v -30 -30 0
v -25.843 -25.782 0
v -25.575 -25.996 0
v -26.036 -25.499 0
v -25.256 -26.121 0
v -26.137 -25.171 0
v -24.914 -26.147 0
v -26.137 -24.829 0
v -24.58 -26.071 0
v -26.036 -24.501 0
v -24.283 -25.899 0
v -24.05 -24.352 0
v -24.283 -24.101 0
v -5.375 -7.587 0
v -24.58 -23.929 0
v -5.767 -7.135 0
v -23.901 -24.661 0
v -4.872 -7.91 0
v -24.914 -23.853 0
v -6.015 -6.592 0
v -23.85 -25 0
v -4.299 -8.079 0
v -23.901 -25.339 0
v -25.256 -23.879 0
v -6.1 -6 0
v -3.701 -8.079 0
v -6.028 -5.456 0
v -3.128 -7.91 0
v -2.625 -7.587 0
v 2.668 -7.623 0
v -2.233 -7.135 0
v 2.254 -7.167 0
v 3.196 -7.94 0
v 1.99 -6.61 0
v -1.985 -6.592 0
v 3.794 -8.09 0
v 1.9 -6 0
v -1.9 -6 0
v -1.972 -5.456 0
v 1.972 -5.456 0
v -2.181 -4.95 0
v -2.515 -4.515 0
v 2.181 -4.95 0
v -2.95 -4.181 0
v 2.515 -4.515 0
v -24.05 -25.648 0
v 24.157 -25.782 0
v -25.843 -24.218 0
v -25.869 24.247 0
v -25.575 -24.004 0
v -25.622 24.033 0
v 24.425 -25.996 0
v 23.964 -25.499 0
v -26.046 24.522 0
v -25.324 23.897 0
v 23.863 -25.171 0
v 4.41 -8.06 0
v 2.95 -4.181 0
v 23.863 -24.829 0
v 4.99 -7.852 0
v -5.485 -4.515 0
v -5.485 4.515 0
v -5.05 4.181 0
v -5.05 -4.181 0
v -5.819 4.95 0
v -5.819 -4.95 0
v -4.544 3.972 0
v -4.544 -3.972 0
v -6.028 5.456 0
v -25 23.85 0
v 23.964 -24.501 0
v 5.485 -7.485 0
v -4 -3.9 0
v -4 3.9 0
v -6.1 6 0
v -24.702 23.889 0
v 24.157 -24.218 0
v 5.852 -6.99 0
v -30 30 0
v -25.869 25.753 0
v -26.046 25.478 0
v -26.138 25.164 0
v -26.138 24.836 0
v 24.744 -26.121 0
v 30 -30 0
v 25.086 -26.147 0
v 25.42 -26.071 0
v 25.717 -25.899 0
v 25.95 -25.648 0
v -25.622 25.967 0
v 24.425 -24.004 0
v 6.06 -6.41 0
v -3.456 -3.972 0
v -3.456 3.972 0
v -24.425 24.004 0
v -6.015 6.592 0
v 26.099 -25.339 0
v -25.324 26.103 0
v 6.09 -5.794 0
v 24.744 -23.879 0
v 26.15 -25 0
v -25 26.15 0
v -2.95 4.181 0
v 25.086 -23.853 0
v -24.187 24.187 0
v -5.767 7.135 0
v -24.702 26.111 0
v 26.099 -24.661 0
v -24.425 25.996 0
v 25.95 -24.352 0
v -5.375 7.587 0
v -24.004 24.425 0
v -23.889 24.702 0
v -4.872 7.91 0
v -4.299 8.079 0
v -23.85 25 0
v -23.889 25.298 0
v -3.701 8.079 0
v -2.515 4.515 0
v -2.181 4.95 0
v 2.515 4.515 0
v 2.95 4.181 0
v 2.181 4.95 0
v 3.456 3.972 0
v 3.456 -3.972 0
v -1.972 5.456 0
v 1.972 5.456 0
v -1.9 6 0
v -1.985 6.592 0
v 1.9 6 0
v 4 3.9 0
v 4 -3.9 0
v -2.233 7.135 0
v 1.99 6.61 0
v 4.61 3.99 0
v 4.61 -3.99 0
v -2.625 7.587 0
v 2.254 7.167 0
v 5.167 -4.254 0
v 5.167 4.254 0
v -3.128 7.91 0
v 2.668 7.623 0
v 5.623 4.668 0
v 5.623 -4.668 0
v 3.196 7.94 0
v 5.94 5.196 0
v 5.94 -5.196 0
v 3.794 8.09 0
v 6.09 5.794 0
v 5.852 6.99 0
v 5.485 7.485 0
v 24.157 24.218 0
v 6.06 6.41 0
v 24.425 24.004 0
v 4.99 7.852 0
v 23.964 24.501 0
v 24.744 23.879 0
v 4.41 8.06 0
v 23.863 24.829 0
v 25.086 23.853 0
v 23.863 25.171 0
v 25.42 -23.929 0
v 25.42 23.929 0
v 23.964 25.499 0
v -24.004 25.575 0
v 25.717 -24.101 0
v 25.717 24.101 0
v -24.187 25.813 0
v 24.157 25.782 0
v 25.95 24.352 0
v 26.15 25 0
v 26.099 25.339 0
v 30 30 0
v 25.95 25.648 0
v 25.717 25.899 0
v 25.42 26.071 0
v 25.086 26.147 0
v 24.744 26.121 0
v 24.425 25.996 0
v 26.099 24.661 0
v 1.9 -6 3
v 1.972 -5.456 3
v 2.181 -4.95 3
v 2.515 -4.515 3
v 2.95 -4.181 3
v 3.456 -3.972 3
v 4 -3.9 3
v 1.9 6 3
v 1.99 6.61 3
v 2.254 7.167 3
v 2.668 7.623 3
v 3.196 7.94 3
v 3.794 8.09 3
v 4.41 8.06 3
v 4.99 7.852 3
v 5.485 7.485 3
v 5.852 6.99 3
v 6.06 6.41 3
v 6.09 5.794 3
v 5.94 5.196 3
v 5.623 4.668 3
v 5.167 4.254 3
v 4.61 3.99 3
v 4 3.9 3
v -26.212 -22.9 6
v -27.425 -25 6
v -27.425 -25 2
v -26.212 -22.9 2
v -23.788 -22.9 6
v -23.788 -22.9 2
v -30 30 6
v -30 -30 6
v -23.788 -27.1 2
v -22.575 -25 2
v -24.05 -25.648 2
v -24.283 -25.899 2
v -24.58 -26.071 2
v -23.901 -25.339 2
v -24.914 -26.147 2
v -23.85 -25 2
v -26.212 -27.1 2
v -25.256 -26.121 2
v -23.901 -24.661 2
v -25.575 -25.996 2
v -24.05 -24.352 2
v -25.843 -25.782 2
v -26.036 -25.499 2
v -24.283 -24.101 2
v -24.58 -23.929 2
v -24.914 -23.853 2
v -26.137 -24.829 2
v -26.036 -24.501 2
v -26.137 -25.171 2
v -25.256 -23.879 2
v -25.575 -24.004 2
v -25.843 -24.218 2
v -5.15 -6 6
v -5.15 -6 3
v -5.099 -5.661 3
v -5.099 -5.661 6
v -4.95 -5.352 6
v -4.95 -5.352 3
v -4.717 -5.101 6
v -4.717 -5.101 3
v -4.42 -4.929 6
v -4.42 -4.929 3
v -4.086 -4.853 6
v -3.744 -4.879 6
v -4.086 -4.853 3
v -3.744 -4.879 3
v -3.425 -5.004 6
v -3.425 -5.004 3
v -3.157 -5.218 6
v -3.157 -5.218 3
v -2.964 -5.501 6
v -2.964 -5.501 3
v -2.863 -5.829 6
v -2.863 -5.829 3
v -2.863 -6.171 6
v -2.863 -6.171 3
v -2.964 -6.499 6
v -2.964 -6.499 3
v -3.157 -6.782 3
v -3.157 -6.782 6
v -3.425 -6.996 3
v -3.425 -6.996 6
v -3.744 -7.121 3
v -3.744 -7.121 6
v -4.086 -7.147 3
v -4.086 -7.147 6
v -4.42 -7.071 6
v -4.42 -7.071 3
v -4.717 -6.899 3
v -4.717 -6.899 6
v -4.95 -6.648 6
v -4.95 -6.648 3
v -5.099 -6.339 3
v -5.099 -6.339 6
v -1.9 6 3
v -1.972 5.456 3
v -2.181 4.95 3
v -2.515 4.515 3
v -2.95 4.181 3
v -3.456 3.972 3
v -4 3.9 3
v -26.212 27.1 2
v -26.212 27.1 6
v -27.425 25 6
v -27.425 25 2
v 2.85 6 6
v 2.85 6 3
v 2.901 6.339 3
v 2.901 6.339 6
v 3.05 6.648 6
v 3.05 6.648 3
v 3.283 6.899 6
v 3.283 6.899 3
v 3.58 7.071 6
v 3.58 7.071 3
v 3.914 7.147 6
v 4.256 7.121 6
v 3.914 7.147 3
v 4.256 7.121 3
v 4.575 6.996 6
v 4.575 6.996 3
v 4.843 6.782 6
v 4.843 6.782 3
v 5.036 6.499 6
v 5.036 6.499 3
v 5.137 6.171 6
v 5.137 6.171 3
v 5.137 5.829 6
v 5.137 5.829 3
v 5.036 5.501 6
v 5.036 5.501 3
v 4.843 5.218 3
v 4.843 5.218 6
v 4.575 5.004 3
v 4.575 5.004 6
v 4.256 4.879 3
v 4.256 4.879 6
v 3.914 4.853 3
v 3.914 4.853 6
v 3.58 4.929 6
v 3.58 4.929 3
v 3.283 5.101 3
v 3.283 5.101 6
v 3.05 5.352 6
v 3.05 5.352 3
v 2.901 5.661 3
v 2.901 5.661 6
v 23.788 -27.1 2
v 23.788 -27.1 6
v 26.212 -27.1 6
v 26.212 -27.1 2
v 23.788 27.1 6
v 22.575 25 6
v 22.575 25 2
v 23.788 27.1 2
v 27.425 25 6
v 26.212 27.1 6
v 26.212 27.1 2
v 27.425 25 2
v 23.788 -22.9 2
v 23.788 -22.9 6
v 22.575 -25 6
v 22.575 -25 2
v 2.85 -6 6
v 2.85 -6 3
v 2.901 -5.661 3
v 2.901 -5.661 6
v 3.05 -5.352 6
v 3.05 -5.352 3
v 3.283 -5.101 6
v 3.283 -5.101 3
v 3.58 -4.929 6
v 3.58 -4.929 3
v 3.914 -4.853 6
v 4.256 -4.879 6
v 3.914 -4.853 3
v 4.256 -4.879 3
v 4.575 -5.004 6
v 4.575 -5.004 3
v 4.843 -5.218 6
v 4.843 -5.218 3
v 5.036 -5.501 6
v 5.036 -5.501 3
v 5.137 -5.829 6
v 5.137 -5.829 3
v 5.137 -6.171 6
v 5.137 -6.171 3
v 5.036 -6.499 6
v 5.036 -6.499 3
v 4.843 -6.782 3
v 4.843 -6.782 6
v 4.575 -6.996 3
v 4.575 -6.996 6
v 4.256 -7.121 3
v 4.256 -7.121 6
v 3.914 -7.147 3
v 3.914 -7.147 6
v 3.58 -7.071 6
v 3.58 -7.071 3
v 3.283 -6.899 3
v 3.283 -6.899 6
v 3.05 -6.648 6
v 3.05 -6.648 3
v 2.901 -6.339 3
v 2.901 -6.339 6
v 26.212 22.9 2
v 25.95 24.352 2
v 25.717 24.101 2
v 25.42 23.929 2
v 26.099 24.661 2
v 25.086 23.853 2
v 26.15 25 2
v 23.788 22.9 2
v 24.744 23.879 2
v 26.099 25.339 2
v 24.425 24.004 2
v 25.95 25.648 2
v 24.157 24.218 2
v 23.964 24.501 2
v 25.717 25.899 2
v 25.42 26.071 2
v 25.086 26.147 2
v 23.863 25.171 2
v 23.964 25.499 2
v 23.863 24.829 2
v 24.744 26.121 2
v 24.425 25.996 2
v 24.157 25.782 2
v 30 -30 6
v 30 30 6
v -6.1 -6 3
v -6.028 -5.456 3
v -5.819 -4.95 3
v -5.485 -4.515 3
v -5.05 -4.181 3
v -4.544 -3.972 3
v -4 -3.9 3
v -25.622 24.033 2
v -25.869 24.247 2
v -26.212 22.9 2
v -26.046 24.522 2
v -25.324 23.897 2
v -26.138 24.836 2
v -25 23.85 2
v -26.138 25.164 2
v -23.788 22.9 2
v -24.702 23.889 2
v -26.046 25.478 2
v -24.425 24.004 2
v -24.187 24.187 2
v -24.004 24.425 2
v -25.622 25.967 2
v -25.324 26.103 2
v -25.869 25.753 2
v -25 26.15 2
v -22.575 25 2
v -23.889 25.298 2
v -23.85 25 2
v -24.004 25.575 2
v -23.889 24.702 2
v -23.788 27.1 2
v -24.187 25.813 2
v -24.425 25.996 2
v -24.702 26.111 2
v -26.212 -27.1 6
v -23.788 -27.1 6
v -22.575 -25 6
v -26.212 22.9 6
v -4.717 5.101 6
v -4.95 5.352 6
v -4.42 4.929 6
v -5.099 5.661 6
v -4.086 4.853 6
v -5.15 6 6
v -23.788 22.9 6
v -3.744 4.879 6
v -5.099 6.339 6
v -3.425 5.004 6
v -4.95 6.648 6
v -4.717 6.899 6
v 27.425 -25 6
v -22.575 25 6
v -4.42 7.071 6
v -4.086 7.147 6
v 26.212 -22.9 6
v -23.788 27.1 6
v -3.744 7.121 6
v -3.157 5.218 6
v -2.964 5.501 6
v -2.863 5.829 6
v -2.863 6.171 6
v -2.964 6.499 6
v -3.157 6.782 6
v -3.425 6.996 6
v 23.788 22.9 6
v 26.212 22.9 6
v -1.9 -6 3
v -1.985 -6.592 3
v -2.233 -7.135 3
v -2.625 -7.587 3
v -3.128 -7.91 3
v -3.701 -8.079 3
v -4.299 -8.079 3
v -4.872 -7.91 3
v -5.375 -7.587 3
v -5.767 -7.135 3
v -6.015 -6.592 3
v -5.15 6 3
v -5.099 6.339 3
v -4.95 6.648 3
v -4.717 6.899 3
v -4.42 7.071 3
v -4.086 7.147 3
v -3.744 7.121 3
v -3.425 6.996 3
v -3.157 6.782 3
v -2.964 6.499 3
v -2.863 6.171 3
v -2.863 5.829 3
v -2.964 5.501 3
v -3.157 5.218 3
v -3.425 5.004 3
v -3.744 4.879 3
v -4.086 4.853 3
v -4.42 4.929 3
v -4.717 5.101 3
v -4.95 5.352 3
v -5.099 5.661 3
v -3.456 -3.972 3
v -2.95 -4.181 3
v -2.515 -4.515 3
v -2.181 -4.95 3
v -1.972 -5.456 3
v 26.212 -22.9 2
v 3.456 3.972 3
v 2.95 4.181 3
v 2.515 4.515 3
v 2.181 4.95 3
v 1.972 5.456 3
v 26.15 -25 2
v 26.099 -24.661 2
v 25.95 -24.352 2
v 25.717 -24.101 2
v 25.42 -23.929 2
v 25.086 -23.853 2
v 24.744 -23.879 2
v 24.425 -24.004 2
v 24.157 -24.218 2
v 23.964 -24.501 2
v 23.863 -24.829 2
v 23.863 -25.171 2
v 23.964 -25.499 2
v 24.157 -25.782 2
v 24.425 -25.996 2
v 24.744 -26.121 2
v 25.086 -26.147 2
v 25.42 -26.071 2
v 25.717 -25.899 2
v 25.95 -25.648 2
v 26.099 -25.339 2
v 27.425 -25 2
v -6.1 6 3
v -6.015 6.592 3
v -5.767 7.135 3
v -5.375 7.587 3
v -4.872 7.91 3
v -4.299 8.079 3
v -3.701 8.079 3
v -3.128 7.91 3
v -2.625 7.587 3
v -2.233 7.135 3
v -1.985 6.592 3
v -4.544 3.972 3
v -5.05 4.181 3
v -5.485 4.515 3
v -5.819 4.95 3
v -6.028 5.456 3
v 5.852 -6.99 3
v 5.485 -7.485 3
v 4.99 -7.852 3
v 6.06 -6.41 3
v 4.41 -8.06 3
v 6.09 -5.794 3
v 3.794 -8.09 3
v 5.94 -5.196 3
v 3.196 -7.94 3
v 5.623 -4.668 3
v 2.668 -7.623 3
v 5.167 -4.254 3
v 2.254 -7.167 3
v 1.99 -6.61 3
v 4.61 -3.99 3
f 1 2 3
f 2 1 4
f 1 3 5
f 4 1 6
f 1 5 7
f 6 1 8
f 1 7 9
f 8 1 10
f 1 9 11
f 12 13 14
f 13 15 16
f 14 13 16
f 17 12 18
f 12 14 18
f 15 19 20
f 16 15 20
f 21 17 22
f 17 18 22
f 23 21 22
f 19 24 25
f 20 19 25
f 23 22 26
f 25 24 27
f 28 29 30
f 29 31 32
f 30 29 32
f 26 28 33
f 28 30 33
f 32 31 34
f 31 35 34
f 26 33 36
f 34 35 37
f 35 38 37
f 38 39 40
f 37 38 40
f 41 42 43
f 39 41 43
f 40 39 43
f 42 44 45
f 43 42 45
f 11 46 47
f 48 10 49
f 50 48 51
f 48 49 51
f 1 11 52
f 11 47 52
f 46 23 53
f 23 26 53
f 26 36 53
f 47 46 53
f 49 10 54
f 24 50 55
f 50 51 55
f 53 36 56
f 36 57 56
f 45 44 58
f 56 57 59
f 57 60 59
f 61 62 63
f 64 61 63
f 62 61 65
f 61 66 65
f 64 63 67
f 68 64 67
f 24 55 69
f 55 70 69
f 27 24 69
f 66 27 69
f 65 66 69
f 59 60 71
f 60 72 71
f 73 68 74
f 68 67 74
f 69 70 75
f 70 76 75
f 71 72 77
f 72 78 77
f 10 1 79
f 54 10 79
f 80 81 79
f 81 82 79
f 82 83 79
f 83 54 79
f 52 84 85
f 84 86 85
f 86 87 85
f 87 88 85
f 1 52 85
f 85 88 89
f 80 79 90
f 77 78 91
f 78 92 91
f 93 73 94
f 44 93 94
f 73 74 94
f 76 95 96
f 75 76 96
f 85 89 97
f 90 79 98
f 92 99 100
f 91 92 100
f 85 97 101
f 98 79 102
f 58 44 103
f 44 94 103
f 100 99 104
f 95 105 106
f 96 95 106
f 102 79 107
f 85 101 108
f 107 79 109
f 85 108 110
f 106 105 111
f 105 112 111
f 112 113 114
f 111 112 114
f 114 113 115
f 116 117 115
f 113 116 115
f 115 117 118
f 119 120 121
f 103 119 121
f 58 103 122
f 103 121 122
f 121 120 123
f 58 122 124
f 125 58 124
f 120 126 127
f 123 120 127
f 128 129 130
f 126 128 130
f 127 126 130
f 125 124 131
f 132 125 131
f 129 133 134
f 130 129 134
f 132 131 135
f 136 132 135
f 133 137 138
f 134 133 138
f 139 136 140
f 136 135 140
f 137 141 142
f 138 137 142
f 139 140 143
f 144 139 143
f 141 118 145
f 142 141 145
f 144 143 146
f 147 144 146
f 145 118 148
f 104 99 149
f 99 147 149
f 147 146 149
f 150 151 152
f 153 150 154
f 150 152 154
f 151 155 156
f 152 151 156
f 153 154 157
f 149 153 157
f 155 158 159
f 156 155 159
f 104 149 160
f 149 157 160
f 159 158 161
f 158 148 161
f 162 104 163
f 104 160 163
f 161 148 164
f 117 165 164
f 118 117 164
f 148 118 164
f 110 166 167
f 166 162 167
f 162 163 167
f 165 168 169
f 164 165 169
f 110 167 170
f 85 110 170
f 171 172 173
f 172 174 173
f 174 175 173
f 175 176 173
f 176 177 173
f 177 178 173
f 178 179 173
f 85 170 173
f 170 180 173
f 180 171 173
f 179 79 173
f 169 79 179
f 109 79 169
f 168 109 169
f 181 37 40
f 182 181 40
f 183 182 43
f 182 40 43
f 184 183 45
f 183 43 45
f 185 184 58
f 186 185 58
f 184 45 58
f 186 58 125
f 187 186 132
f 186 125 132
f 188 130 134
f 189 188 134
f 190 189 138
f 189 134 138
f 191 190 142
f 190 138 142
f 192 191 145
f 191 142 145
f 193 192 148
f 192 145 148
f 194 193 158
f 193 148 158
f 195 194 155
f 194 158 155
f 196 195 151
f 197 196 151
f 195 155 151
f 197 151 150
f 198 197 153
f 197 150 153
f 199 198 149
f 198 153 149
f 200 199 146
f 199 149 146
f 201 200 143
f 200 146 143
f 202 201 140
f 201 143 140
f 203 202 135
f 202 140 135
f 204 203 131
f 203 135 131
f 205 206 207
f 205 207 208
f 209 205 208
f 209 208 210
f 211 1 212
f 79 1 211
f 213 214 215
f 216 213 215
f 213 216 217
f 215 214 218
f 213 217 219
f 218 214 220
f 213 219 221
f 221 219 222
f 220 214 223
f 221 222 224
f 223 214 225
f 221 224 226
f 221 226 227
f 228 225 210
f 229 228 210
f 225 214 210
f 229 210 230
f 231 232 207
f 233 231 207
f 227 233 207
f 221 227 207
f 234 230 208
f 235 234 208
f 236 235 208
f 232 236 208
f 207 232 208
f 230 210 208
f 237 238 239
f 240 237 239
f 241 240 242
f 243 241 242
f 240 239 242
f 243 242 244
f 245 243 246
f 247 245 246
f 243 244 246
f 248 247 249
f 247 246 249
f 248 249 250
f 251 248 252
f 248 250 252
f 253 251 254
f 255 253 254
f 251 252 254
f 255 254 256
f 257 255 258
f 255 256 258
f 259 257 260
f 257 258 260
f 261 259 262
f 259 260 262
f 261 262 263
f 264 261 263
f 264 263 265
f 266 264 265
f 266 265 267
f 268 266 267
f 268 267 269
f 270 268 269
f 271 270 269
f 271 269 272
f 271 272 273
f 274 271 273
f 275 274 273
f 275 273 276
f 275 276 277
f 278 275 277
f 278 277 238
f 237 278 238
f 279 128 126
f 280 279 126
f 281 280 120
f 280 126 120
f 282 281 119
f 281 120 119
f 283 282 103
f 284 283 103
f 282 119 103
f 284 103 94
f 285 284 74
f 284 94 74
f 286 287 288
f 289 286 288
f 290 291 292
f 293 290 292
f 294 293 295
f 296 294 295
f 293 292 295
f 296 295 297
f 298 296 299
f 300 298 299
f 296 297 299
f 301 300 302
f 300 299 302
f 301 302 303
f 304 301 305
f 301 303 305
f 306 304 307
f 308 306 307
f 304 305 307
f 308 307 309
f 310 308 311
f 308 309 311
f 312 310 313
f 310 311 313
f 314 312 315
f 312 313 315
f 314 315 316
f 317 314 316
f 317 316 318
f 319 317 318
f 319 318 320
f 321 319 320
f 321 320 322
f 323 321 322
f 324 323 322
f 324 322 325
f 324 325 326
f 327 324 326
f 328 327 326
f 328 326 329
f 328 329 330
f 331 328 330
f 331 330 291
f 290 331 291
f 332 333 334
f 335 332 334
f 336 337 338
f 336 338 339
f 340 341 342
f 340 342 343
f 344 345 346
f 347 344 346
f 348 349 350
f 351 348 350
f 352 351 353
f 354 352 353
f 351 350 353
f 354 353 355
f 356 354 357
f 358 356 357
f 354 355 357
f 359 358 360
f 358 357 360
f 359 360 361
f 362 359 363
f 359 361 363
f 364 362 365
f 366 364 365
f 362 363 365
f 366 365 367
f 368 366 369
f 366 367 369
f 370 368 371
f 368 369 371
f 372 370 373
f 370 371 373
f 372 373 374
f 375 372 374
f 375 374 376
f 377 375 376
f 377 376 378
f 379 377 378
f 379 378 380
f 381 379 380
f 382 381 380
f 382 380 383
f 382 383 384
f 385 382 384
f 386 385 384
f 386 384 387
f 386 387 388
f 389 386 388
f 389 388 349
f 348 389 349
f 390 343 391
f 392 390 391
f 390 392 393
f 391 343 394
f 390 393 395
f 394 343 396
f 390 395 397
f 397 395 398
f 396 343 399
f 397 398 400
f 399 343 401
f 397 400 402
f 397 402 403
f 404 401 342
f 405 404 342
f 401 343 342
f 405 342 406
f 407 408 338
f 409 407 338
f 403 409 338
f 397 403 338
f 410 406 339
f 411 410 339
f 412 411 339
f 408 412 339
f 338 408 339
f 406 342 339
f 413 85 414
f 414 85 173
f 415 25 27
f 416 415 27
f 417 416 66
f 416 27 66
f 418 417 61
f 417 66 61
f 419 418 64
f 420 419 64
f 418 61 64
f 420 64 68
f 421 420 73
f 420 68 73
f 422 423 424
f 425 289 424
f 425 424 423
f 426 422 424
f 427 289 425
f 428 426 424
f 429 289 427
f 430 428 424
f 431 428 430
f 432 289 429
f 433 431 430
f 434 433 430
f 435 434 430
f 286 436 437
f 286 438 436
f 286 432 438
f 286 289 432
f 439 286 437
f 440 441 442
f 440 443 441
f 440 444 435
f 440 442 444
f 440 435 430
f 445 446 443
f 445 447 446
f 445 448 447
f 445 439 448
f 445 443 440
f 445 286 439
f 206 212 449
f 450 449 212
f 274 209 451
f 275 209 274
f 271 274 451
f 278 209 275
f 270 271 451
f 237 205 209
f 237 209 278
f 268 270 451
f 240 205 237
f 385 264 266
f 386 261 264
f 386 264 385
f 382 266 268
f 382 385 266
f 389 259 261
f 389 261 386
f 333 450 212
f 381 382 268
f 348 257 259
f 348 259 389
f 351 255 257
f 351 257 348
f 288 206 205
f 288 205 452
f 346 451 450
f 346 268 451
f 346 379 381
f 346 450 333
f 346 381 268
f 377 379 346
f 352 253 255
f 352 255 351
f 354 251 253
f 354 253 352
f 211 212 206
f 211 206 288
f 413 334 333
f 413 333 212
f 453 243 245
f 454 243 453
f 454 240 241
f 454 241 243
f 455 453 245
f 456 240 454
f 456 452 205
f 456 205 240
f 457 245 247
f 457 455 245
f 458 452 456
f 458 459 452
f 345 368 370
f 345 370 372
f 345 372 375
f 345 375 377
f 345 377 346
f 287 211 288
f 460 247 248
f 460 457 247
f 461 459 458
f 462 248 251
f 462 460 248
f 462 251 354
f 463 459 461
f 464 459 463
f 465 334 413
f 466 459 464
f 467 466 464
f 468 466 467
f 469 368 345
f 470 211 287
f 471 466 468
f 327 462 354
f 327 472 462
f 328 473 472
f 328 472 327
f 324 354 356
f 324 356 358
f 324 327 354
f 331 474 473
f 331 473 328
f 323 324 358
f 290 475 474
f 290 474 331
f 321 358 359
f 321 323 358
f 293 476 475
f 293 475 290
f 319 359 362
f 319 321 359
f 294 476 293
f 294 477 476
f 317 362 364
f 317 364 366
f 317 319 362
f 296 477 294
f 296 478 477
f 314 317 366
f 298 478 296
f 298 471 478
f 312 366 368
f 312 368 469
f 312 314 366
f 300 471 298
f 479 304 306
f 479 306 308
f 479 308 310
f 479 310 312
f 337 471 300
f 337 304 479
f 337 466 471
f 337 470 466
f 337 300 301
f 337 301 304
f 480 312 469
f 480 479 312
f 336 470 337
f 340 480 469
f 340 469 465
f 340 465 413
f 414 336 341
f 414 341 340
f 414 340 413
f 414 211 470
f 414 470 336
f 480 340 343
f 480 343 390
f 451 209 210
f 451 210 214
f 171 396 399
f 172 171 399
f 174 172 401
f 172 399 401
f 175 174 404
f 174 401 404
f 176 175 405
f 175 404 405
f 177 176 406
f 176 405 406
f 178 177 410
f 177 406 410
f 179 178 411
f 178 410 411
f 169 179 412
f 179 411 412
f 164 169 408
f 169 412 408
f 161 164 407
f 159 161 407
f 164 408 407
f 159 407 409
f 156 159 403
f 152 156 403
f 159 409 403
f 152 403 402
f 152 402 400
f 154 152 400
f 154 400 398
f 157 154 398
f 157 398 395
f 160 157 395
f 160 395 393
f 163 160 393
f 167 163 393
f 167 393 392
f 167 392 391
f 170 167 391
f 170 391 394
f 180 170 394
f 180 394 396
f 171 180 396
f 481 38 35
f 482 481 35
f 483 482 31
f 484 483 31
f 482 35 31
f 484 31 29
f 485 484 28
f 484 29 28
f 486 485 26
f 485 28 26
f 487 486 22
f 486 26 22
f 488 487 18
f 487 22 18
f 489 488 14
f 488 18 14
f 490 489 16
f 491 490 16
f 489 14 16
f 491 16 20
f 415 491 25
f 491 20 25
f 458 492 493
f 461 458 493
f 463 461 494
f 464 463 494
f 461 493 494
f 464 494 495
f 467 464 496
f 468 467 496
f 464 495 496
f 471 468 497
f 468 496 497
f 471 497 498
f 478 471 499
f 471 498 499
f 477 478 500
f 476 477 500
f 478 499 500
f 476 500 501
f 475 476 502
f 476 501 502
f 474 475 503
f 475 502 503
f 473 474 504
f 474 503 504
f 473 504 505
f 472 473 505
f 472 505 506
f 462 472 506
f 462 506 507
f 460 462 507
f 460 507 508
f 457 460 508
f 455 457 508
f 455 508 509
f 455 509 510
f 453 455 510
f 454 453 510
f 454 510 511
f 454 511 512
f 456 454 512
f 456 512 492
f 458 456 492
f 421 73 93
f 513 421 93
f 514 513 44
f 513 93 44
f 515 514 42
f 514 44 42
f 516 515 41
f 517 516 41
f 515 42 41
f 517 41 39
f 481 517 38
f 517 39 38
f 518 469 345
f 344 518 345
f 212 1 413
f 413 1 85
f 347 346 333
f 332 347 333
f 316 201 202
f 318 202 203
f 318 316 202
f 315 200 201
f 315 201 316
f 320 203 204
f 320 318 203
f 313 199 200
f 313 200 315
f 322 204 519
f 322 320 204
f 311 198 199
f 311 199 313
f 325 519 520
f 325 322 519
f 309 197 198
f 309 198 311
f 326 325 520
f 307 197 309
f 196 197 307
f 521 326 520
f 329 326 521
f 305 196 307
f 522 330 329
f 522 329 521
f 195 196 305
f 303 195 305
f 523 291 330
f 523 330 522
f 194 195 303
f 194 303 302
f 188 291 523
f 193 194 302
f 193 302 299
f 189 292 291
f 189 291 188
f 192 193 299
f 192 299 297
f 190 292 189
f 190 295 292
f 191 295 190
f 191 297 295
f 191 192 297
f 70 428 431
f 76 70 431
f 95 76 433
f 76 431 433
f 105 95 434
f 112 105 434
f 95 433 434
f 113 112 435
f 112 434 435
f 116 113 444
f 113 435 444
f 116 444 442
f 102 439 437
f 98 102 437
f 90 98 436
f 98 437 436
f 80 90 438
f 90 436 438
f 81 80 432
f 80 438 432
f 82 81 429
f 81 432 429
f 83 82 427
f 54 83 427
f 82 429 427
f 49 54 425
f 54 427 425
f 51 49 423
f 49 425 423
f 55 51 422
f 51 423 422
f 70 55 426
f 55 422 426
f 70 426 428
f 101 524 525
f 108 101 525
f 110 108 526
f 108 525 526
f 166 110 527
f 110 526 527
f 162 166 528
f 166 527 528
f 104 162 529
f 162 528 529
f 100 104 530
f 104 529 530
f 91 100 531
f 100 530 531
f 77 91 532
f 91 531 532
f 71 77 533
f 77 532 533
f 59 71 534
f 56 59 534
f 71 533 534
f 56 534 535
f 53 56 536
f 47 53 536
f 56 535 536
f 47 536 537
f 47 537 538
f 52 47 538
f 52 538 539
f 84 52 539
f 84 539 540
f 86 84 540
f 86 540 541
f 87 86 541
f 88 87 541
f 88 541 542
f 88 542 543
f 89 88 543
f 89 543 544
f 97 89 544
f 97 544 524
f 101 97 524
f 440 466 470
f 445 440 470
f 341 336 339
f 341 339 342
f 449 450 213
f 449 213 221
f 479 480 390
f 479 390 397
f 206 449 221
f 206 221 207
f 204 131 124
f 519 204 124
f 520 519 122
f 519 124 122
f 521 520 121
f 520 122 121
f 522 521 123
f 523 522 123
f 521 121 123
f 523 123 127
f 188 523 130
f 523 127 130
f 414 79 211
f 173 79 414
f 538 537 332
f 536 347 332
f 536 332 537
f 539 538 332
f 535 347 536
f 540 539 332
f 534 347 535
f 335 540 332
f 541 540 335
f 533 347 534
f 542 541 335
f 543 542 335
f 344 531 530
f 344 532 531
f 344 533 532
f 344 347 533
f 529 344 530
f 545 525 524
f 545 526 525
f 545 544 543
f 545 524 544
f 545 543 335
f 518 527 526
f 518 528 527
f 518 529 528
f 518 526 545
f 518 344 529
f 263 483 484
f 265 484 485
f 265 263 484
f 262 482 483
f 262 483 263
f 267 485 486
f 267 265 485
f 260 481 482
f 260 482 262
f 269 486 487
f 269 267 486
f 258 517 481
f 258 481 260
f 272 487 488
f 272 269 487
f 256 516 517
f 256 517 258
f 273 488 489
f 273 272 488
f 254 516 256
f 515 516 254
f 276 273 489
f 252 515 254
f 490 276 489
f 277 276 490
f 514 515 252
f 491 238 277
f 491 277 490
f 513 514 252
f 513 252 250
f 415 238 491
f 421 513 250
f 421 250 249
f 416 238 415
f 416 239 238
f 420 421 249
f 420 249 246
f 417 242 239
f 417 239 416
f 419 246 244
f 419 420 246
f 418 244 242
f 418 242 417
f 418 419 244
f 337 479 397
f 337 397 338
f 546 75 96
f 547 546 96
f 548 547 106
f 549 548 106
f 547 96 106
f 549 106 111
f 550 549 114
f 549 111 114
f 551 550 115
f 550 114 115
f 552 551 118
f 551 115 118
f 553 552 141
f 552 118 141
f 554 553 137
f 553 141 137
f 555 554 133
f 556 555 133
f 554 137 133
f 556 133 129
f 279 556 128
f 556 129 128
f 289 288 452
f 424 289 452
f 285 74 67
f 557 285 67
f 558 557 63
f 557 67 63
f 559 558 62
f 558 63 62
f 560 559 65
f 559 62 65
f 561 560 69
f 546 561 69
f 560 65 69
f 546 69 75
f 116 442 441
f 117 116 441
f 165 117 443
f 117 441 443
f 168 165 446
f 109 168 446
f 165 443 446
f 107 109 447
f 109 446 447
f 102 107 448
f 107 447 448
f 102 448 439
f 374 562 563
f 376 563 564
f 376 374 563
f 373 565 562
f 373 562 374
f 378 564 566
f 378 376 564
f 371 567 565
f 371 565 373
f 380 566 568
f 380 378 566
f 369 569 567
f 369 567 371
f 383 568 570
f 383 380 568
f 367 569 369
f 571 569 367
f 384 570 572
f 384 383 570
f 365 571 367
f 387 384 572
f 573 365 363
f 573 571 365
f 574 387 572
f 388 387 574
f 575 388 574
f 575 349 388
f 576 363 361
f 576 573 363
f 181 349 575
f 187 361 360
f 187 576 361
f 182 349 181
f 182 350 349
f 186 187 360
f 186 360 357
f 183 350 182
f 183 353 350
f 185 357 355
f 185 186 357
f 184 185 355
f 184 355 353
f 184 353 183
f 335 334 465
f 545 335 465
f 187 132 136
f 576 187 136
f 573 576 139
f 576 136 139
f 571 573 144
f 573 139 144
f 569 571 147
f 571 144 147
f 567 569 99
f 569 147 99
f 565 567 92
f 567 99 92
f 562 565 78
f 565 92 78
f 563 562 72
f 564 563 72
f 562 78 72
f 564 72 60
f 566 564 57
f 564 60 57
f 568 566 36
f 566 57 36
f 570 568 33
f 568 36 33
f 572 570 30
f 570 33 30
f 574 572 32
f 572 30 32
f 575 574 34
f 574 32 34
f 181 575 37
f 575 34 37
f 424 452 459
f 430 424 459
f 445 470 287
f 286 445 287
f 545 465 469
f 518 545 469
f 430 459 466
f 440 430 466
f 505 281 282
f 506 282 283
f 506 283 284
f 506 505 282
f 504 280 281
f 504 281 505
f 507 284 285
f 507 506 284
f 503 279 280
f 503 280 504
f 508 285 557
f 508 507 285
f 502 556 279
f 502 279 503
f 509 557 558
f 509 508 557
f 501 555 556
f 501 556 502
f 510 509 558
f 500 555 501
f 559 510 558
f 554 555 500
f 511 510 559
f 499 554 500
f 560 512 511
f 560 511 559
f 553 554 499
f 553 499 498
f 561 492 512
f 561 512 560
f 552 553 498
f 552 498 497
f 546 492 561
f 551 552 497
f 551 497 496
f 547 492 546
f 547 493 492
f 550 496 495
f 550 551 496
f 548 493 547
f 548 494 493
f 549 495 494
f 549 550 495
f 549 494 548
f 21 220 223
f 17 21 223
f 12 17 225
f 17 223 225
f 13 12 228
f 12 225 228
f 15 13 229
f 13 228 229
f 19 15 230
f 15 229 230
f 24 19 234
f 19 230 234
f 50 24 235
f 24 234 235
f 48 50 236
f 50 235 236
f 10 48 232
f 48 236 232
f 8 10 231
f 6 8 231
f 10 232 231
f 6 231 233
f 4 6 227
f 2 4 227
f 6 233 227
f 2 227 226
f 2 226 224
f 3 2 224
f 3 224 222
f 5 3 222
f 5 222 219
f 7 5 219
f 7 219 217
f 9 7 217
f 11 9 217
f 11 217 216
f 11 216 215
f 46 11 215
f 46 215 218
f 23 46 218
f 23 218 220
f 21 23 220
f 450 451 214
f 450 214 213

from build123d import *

# Parameters (mm, degrees)
SKETCH1_W           = 60
SKETCH1_H           = 60
BOSS_EXTRUDE1_DEPTH = 6
SKETCH2_R           = 1.15
CUT_EXTRUDE1_DEPTH  = 43.848570571
SKETCH3_R           = 1.15
CUT_EXTRUDE2_DEPTH  = 4
CUT_EXTRUDE3_DEPTH  = 3
SKETCH5_R           = 1.15
CUT_EXTRUDE4_DEPTH  = 43.532340636


with BuildPart() as part:
    # Sketch1 → Boss-Extrude1 (new body)
    with BuildSketch(Plane.XY):
        Rectangle(SKETCH1_W, SKETCH1_H)
    extrude(amount=BOSS_EXTRUDE1_DEPTH)

    # Sketch2 → Cut-Extrude1 (cut, through all)
    with BuildSketch(Plane.XY.offset(6)):
        with BuildLine():
            ThreePointArc((-25, 26.15), (-26.15, 25), (-25, 23.85))
            Line((-25, 23.85), (-25, 26.15))
        make_face()
        with BuildLine():
            Line((-25, 26.15), (-25, 23.85))
            ThreePointArc((-25, 23.85), (-24.186827202, 24.186827202), (-23.85, 25))
            ThreePointArc((-23.85, 25), (-24.186827202, 25.813172798), (-25, 26.15))
        make_face()
        with Locations((25, 25)):
            Circle(SKETCH2_R)
        with Locations((25, -25)):
            Circle(SKETCH2_R)
        with Locations((-25, -25)):
            Circle(SKETCH2_R)
    extrude(amount=-CUT_EXTRUDE1_DEPTH, mode=Mode.SUBTRACT)

    # Sketch3 → Cut-Extrude2 (cut)
    # profile 1 of 4: a face of its own
    with BuildSketch(Plane.XY.offset(6)):
        Polygon((-26.212435565, 22.9), (-23.787564435, 22.9), (-22.575128869, 25), (-23.787564435, 27.1), (-26.212435565, 27.1), (-27.424871131, 25), align=None)
        with Locations((-25, 25)):
            Circle(SKETCH3_R, mode=Mode.SUBTRACT)
    # profile 2 of 4: a face of its own
    with BuildSketch(Plane.XY.offset(6)):
        Polygon((22.575128869, 25), (23.787564435, 27.1), (26.212435565, 27.1), (27.424871131, 25), (26.212435565, 22.9), (23.787564435, 22.9), align=None)
        with Locations((25, 25)):
            Circle(SKETCH3_R, mode=Mode.SUBTRACT)
    # profile 3 of 4: a face of its own
    with BuildSketch(Plane.XY.offset(6)):
        Polygon((26.212435565, -22.9), (23.787564435, -22.9), (22.575128869, -25), (23.787564435, -27.1), (26.212435565, -27.1), (27.424871131, -25), align=None)
        with Locations((25, -25)):
            Circle(SKETCH3_R, mode=Mode.SUBTRACT)
    # profile 4 of 4: a face of its own
    with BuildSketch(Plane.XY.offset(6)):
        Polygon((-22.575128869, -25), (-23.787564435, -27.1), (-26.212435565, -27.1), (-27.424871131, -25), (-26.212435565, -22.9), (-23.787564435, -22.9), align=None)
        with Locations((-25, -25)):
            Circle(SKETCH3_R, mode=Mode.SUBTRACT)
    extrude(amount=-CUT_EXTRUDE2_DEPTH, mode=Mode.SUBTRACT)

    # Sketch4 → Cut-Extrude3 (cut)
    with BuildSketch(Plane(origin=(0, 0, 0), x_dir=(-1, 0, 0), z_dir=(0, 0, -1))):
        with BuildLine():
            ThreePointArc((-4, 3.9), (-2.51507576, 4.51507576), (-1.9, 6))
            Line((-1.9, 6), (-4, 6))
            Line((-4, 6), (-4, 3.9))
        make_face()
        with BuildLine():
            Line((-4, 6), (-1.9, 6))
            ThreePointArc((-1.9, 6), (-5.48492424, 7.48492424), (-4, 3.9))
            Line((-4, 3.9), (-4, 6))
        make_face()
        with BuildLine():
            ThreePointArc((6.1, 6), (4, 8.1), (1.9, 6))
            Line((1.9, 6), (4, 6))
            Line((4, 6), (4, 3.9))
            ThreePointArc((4, 3.9), (5.48492424, 4.51507576), (6.1, 6))
        make_face()
        with BuildLine():
            Line((4, 6), (1.9, 6))
            ThreePointArc((1.9, 6), (2.51507576, 4.51507576), (4, 3.9))
            Line((4, 3.9), (4, 6))
        make_face()
        with BuildLine():
            ThreePointArc((4, -3.9), (2.51507576, -4.51507576), (1.9, -6))
            Line((1.9, -6), (4, -6))
            Line((4, -6), (4, -3.9))
        make_face()
        with BuildLine():
            Line((4, -6), (1.9, -6))
            ThreePointArc((1.9, -6), (4, -8.1), (6.1, -6))
            ThreePointArc((6.1, -6), (5.48492424, -4.51507576), (4, -3.9))
            Line((4, -3.9), (4, -6))
        make_face()
        with BuildLine():
            ThreePointArc((-4, -3.9), (-5.48492424, -7.48492424), (-1.9, -6))
            Line((-1.9, -6), (-4, -6))
            Line((-4, -6), (-4, -3.9))
        make_face()
        with BuildLine():
            Line((-4, -6), (-1.9, -6))
            ThreePointArc((-1.9, -6), (-2.51507576, -4.51507576), (-4, -3.9))
            Line((-4, -3.9), (-4, -6))
        make_face()
    extrude(amount=-CUT_EXTRUDE3_DEPTH, mode=Mode.SUBTRACT)

    # Sketch5 → Cut-Extrude4 (cut, through all)
    with BuildSketch(Plane(origin=(0, 0, 3), x_dir=(-1, 0, 0), z_dir=(0, 0, -1))):
        with Locations((-4, 6)):
            Circle(SKETCH5_R)
        with Locations((4, 6)):
            Circle(SKETCH5_R)
        with Locations((4, -6)):
            Circle(SKETCH5_R)
        with Locations((-4, -6)):
            Circle(SKETCH5_R)
    extrude(amount=-CUT_EXTRUDE4_DEPTH, mode=Mode.SUBTRACT)


solid = part.part
